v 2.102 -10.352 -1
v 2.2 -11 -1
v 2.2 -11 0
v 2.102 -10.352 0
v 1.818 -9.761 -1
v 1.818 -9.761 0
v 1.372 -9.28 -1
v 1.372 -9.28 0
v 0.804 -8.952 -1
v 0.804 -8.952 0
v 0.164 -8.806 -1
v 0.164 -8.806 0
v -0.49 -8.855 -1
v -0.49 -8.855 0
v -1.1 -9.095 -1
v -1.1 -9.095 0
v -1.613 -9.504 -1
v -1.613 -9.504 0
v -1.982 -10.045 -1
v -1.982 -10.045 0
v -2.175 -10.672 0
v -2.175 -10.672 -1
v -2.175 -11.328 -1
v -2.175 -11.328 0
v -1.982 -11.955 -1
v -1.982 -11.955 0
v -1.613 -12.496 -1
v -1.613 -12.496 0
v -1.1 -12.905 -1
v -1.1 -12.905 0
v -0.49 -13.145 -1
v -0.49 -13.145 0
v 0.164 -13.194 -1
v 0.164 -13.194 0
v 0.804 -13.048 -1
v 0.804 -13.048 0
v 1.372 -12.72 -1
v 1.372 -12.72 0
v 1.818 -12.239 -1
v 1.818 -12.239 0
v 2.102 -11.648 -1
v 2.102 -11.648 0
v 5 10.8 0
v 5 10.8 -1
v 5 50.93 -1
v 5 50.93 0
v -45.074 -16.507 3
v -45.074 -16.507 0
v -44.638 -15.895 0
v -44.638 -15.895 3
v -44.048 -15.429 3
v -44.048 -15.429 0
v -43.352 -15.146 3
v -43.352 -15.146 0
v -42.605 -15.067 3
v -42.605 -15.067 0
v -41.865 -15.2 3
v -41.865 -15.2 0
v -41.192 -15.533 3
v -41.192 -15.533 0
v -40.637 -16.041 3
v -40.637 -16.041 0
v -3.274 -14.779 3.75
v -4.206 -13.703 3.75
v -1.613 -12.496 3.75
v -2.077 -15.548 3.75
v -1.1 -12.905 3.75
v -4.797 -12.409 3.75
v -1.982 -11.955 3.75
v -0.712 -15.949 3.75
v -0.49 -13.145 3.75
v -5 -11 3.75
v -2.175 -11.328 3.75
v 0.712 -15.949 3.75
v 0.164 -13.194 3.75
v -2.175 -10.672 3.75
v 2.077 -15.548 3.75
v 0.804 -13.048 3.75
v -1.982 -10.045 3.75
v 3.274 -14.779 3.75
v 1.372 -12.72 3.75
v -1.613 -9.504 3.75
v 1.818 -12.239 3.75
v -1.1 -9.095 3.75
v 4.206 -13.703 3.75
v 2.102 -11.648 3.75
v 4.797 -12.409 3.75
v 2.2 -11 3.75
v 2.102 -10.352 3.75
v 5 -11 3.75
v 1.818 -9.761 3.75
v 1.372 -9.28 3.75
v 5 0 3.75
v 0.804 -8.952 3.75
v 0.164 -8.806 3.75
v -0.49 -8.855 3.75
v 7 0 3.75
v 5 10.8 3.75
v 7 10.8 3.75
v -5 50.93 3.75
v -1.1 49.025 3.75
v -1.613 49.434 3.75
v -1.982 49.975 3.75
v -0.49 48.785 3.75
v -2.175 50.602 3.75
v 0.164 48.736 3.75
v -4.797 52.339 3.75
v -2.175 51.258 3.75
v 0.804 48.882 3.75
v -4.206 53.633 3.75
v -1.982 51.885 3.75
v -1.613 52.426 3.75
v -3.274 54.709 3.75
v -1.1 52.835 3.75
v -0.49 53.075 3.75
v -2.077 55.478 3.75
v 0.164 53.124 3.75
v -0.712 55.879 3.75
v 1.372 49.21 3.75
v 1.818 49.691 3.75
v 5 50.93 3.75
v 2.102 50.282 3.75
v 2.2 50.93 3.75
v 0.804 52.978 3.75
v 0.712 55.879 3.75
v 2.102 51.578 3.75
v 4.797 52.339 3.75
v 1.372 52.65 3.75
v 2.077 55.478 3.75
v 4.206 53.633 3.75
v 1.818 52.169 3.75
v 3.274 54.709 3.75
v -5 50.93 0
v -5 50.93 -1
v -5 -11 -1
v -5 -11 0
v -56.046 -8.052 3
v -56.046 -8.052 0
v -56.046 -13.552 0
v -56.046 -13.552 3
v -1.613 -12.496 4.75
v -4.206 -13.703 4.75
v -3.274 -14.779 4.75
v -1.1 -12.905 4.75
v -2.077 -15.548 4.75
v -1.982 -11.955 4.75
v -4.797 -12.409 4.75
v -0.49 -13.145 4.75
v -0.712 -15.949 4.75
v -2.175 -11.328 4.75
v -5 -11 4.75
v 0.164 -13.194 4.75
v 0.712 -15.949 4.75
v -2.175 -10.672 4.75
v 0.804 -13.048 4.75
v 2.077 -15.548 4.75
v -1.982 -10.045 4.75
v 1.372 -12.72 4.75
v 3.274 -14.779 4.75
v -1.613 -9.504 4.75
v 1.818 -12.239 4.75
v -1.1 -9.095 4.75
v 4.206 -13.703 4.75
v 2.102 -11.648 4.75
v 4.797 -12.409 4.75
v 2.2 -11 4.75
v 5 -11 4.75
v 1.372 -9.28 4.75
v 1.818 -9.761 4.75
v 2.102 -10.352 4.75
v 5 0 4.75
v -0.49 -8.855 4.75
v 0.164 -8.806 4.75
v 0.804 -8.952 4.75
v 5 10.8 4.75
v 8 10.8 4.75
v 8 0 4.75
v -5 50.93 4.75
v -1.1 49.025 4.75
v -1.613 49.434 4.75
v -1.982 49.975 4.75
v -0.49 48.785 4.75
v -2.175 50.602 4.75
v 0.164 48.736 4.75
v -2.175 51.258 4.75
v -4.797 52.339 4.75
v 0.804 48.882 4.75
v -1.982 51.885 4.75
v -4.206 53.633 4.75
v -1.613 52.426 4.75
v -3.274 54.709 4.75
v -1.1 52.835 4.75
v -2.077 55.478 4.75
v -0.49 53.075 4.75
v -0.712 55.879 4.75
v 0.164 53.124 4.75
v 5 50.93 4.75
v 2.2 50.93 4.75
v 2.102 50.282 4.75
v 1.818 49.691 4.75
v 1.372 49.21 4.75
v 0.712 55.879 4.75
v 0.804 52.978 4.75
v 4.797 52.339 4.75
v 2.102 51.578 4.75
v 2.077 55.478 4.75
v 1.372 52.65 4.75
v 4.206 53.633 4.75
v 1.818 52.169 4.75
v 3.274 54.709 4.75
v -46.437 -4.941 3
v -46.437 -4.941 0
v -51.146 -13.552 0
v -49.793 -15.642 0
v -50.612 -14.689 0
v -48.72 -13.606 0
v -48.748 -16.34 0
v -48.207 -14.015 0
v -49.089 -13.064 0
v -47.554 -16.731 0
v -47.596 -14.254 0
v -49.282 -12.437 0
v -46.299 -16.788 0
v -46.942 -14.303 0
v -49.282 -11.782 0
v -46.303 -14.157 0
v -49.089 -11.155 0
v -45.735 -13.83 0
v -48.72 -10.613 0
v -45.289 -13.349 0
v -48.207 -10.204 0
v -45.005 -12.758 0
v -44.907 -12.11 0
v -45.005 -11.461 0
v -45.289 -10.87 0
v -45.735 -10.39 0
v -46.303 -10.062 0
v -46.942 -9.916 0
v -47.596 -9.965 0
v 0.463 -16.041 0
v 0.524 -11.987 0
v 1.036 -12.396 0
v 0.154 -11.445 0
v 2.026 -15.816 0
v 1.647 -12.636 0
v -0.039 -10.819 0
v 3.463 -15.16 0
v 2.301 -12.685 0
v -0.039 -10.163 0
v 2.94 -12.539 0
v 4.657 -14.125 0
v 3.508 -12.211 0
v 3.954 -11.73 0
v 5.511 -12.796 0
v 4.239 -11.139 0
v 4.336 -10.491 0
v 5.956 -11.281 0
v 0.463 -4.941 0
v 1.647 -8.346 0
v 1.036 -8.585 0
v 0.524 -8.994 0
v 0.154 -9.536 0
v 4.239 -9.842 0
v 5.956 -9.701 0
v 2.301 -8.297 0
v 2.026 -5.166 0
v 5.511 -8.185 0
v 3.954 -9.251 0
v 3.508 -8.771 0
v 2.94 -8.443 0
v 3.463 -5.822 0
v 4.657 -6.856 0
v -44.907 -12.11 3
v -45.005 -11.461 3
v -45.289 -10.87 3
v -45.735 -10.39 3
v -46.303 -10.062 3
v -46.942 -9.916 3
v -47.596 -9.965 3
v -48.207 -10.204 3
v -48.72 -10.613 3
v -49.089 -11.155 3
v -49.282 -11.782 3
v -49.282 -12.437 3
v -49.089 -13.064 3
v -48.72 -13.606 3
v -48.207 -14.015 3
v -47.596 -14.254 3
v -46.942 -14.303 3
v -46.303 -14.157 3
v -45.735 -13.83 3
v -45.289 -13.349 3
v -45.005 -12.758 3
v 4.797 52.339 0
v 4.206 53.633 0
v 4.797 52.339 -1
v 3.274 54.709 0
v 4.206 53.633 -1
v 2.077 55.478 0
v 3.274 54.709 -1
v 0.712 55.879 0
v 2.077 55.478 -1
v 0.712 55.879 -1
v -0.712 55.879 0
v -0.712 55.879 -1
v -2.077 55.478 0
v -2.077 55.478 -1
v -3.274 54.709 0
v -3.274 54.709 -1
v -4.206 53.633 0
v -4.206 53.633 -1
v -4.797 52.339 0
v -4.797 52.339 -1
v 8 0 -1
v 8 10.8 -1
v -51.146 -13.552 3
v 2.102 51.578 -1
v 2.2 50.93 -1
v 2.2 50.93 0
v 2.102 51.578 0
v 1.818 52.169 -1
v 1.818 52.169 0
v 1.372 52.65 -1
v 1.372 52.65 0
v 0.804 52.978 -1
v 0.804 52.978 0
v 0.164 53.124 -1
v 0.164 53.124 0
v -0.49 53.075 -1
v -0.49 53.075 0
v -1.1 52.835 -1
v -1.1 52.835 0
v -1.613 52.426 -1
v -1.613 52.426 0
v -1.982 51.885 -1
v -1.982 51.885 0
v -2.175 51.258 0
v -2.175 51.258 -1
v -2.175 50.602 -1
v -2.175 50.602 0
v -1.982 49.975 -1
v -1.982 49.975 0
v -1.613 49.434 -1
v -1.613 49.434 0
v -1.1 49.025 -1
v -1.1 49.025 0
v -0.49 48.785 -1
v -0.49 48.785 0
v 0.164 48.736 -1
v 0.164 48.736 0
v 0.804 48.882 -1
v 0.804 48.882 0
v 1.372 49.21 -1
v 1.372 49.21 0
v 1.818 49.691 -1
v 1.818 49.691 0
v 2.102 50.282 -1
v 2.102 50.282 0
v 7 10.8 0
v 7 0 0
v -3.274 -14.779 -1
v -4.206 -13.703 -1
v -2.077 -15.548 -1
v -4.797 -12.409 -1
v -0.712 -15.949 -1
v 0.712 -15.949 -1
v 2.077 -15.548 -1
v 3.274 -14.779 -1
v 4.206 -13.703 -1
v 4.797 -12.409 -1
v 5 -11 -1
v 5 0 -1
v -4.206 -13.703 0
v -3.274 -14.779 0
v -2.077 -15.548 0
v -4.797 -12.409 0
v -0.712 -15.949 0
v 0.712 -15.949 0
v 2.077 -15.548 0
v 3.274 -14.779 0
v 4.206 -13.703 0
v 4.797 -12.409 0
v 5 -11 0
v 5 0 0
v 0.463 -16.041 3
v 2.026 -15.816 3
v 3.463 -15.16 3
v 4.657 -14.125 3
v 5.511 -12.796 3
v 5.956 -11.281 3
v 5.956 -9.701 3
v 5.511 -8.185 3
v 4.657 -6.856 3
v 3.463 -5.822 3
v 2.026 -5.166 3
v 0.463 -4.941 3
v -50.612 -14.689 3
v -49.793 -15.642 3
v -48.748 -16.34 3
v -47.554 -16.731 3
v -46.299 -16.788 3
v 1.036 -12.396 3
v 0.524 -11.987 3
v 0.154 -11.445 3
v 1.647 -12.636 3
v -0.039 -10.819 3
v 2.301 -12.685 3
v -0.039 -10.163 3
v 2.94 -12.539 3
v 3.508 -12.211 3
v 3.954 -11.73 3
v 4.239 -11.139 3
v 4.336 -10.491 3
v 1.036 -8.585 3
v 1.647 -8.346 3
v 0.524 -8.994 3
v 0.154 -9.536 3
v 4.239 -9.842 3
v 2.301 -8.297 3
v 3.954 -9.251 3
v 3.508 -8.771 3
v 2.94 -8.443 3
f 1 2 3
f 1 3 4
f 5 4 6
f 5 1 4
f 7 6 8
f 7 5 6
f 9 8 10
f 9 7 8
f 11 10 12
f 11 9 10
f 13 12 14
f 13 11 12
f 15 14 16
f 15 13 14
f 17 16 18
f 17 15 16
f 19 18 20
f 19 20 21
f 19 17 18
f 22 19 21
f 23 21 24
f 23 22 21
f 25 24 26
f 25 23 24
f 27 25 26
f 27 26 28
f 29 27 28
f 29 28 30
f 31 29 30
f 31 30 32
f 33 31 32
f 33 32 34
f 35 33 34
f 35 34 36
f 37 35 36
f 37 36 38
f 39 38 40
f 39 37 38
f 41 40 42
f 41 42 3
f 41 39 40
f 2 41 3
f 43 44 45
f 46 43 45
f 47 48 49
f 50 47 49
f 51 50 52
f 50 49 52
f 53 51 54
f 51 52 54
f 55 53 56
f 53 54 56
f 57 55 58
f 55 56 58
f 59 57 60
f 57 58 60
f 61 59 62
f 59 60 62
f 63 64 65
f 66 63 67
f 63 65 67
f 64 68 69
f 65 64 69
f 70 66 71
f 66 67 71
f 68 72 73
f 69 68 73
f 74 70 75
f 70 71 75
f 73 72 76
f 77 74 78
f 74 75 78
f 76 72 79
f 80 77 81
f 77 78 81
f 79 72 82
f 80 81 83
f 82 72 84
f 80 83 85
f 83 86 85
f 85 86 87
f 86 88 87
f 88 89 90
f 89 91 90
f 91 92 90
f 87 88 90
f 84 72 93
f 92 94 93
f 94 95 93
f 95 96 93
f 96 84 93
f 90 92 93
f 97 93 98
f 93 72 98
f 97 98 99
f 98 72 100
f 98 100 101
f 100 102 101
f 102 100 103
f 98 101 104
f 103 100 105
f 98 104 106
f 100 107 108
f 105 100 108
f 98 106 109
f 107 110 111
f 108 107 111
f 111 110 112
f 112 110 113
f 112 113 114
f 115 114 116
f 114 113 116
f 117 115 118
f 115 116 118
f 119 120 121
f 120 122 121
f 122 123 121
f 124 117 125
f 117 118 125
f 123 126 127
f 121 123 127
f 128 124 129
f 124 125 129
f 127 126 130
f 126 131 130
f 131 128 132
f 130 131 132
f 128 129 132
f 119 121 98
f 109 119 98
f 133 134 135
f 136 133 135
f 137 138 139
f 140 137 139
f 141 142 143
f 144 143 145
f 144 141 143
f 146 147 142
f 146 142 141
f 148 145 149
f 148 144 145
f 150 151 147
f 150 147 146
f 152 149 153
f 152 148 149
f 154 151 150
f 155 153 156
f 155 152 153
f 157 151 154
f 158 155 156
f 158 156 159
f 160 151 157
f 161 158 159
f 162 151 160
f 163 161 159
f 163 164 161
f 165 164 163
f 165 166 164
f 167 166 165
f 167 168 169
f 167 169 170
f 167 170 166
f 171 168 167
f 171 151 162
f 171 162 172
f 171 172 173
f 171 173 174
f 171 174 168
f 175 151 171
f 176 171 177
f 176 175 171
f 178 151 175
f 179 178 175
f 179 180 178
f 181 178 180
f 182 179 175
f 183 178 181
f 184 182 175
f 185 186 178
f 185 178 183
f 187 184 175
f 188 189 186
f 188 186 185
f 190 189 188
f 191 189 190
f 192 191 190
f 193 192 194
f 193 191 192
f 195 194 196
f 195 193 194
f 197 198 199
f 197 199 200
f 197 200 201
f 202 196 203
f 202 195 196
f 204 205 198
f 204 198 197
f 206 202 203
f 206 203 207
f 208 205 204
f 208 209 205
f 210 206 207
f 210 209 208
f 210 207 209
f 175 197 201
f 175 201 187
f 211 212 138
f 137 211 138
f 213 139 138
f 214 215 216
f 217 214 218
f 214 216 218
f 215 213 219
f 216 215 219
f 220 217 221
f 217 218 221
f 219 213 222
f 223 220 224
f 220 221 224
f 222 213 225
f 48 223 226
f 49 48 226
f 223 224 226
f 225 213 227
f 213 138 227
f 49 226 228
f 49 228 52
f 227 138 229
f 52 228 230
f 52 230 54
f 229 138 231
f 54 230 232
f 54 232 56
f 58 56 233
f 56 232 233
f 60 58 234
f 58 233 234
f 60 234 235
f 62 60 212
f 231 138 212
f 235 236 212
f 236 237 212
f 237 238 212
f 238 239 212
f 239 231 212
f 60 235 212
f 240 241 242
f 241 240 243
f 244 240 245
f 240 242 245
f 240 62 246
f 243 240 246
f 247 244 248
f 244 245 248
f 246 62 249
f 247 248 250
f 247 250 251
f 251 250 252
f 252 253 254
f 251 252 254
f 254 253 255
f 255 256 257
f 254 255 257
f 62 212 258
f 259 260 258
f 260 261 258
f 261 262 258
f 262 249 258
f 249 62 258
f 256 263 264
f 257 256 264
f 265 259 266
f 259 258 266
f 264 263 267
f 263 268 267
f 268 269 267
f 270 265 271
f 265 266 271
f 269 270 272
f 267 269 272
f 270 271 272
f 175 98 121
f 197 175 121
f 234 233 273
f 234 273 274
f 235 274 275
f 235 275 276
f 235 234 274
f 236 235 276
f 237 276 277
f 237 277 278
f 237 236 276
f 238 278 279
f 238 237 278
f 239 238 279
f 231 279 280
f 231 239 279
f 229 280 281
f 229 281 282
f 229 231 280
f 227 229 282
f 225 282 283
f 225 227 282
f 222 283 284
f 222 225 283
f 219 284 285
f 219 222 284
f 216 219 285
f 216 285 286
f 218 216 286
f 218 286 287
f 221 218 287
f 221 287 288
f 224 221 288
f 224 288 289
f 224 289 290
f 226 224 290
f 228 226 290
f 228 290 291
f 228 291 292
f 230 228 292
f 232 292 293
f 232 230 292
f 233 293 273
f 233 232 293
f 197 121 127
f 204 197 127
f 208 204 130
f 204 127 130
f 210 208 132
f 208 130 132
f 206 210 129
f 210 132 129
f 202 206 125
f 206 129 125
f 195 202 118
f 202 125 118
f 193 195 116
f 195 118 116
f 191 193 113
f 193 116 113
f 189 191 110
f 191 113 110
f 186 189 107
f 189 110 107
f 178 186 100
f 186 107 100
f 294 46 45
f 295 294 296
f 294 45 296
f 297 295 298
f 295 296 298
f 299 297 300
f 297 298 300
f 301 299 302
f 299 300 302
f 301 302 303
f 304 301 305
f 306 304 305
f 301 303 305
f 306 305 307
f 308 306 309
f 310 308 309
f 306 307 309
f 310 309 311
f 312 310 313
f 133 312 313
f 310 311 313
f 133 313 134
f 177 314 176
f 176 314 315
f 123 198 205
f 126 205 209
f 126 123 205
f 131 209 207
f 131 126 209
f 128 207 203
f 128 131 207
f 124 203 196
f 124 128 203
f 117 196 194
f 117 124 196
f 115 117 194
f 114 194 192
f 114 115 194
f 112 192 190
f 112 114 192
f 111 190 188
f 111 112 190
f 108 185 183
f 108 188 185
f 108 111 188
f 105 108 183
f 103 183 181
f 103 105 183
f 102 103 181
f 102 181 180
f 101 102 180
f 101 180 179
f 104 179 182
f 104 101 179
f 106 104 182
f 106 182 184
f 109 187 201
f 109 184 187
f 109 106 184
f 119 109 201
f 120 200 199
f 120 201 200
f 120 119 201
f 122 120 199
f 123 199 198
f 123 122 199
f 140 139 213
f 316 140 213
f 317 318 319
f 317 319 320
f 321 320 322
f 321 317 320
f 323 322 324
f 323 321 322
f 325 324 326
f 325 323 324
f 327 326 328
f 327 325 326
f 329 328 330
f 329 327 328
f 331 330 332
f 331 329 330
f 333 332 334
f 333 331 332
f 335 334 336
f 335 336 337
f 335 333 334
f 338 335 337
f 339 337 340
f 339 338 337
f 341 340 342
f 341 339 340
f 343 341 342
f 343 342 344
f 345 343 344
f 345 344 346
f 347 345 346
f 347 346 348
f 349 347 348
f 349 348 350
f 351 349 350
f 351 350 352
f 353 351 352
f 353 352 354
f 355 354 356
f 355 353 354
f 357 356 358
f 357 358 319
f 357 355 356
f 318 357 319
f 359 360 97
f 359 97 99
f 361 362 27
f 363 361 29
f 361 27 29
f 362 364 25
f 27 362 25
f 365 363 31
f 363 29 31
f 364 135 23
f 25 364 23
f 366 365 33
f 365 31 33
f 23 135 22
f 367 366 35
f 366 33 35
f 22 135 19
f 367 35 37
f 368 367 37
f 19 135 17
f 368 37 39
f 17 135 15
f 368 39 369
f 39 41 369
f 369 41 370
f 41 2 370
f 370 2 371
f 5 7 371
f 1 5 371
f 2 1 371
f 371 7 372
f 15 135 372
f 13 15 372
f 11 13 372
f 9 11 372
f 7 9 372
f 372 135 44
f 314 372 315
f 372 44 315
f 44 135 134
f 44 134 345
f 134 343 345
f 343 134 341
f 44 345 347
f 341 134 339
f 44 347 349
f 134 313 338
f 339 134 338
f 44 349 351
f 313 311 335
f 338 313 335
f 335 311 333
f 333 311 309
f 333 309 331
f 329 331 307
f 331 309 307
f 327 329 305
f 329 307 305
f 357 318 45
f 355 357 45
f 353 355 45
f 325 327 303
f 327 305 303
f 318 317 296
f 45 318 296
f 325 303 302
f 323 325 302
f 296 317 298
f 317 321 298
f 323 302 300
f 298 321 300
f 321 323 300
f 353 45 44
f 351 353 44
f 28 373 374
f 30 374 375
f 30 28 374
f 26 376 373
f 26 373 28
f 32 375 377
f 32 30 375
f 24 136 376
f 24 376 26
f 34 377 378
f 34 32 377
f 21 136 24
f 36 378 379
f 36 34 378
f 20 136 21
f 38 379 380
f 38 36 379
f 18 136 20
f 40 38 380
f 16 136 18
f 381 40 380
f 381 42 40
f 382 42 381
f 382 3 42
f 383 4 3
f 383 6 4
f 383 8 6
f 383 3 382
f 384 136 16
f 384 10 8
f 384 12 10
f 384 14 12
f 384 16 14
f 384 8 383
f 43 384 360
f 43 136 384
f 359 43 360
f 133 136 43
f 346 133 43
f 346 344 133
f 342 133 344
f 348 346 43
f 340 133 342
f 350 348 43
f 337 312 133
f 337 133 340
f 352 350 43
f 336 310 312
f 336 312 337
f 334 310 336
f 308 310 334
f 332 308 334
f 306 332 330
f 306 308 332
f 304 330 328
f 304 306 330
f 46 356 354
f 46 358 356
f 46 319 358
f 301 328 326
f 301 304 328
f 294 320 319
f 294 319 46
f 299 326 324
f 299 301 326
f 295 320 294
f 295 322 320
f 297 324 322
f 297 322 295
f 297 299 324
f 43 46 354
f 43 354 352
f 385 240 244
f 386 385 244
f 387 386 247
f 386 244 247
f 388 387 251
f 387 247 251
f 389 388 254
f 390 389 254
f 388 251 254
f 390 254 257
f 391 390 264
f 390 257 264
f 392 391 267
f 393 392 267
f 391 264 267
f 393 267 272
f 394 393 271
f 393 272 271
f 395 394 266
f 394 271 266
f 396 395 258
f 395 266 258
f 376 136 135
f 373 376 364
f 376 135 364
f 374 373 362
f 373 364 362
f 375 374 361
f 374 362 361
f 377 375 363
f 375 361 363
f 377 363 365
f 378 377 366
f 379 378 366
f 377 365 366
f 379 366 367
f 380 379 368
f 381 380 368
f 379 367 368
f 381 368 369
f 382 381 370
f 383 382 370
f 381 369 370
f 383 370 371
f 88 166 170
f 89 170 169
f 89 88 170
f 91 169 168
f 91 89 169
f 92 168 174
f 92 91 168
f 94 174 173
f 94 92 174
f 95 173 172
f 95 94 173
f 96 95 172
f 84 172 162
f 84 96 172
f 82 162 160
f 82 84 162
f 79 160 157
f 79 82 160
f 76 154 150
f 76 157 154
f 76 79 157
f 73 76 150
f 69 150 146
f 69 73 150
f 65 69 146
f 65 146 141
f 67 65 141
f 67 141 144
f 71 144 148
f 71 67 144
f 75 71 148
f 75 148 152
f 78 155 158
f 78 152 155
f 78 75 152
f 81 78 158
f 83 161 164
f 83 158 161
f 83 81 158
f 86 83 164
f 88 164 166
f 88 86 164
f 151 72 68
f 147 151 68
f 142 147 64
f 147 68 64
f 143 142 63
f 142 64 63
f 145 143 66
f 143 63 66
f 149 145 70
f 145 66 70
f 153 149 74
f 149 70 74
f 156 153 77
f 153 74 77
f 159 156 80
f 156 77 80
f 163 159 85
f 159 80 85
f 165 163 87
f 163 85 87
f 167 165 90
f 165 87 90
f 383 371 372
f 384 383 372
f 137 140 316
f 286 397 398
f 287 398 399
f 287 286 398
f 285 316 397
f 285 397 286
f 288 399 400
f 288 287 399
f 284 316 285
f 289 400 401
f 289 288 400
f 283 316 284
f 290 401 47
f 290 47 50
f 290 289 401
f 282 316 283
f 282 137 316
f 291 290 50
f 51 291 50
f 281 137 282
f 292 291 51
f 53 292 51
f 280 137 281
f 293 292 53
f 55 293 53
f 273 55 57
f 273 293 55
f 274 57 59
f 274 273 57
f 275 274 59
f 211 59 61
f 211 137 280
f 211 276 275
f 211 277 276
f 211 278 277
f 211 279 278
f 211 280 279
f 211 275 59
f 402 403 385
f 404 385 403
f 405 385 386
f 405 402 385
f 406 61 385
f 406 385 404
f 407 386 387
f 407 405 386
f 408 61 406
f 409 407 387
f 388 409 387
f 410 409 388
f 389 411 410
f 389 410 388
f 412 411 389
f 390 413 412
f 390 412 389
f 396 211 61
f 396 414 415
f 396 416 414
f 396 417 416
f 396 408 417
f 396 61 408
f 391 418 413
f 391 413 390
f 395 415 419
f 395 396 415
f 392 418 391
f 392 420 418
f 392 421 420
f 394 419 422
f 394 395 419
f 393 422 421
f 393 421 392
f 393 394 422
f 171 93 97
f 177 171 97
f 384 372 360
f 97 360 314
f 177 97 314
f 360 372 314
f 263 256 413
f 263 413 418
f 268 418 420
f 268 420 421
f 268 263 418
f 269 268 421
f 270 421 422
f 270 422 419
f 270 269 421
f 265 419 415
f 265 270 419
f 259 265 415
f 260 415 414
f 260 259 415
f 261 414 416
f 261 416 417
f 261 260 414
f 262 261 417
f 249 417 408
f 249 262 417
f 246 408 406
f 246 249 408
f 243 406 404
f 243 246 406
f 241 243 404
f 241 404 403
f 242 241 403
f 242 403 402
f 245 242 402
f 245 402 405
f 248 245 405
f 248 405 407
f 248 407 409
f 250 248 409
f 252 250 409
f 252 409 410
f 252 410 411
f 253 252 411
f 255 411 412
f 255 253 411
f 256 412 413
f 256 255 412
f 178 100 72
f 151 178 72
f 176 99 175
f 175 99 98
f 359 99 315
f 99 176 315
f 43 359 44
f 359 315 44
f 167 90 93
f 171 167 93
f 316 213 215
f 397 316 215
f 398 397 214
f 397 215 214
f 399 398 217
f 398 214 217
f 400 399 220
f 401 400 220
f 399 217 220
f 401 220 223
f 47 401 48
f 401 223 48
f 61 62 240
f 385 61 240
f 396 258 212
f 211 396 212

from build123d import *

# Parameters (mm, degrees)
F0_R     = 2.2
F1_DEPTH = 3.75
F2_T     = 1
F3_R     = 2.2
F4_DEPTH = 3


with BuildPart() as f1:
    # F0 (on Top) → F1 (new body)
    with BuildSketch(Plane.XY):
        with BuildLine():
            Line((-5, 50.93), (-5, 0))
            Line((-5, 0), (-5, -11))
            ThreePointArc((-5, -11), (0, -16), (5, -11))
            Line((5, -11), (5, 0))
            Line((5, 0), (7, 0))
            Line((7, 0), (7, 10.8))
            Line((7, 10.8), (5, 10.8))
            Line((5, 10.8), (5, 50.93))
            ThreePointArc((5, 50.93), (0, 55.93), (-5, 50.93))
        make_face()
        with Locations((0, -11)):
            Circle(F0_R, mode=Mode.SUBTRACT)
        with Locations((0, 50.93)):
            Circle(F0_R, mode=Mode.SUBTRACT)
    extrude(amount=F1_DEPTH)

    # F2
    f2_openings = [f1.faces().sort_by_distance(p)[0] for p in [
        (-5, 19.965, 1.875),
        (0, 55.93, 1.875),
        (0, -16, 1.875),
        (5, -5.5, 1.875),
        (6, 0, 1.875),
        (6, 10.8, 1.875),
        (5, 30.865, 1.875),
        (-2.2, 50.93, 1.875),
        (-2.2, -11, 1.875),
    ]]
    offset(amount=F2_T, openings=f2_openings, kind=Kind.INTERSECTION)


with BuildPart() as f4:
    # F3 (on Top) → F4 (new body)
    with BuildSketch(Plane.XY):
        with BuildLine():
            Line((0.4625649198, -4.9407491021), (-46.4374350802, -4.9407491021))
            Line((-46.4374350802, -4.9407491021), (-56.0463459179, -8.0518313113))
            Line((-56.0463459179, -8.0518313113), (-56.0463459179, -13.5518313113))
            Line((-56.0463459179, -13.5518313113), (-51.1463459179, -13.5518313113))
            ThreePointArc((-51.1463459179, -13.5518313113), (-48.7478397903, -16.3395991716), (-45.0740717351, -16.5066607296))
            ThreePointArc((-45.0740717351, -16.5066607296), (-42.9811130235, -15.0799698083), (-40.6374350802, -16.0407491021))
            Line((-40.6374350802, -16.0407491021), (0.4625649198, -16.0407491021))
            ThreePointArc((0.4625649198, -16.0407491021), (6.0125649198, -10.4907491021), (0.4625649198, -4.9407491021))
        make_face()
        with Locations((-47.1068173292, -12.1095654204)):
            Circle(F3_R, mode=Mode.SUBTRACT)
        with Locations((2.1364323051, -10.4907491021)):
            Circle(F3_R, mode=Mode.SUBTRACT)
    extrude(amount=F4_DEPTH)


solid = Compound([f1.part, f4.part])
